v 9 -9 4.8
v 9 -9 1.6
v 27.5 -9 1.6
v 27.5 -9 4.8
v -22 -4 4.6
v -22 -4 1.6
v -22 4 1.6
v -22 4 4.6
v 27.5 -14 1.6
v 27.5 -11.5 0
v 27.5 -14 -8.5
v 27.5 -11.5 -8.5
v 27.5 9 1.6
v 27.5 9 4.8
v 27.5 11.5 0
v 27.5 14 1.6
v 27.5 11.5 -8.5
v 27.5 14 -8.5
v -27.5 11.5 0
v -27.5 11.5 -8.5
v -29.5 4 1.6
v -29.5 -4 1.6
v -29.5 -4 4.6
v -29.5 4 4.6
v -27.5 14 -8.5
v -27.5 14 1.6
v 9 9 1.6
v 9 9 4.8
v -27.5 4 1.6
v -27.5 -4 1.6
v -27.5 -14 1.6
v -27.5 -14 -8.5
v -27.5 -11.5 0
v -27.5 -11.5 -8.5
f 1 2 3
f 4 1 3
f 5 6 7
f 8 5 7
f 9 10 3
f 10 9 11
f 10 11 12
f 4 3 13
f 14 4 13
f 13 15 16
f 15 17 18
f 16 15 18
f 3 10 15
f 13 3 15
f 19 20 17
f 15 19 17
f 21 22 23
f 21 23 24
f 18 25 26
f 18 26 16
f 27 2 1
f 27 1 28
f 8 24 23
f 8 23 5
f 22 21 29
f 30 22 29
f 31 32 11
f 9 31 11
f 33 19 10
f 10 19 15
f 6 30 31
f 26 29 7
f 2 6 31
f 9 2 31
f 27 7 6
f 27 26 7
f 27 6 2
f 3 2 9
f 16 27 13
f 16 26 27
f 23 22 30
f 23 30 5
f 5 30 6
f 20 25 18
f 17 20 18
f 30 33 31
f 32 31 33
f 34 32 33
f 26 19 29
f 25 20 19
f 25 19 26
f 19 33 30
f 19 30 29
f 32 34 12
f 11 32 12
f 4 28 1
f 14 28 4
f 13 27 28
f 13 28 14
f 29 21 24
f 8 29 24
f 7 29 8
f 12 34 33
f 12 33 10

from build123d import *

# Parameters (mm, degrees)
SKETCH1_W          = 55
SKETCH1_H          = 28
PCB_DEPTH          = 1.6
SKETCH2_W          = 55
SKETCH2_H          = 2.5
HEADER_A_DEPTH     = 8.5
SKETCH3_W          = 55
SKETCH3_H          = 2.5
HEADER_B_DEPTH     = 8.5
SKETCH4_W          = 18.5
SKETCH4_H          = 18
WROOM_MODULE_DEPTH = 3.2
SKETCH5_W          = 7.5
SKETCH5_H          = 8
USB_DEPTH          = 3


with BuildPart() as part:
    # Sketch1 → PCB (new body)
    with BuildSketch(Plane.XY):
        Rectangle(SKETCH1_W, SKETCH1_H)
    extrude(amount=PCB_DEPTH)

    # Sketch2 → Header_A (add)
    with BuildSketch(Plane.XY.offset(-8.5)):
        with Locations((0, -12.75)):
            Rectangle(SKETCH2_W, SKETCH2_H)
    extrude(amount=HEADER_A_DEPTH)

    # Sketch3 → Header_B (add)
    with BuildSketch(Plane.XY.offset(-8.5)):
        with Locations((0, 12.75)):
            Rectangle(SKETCH3_W, SKETCH3_H)
    extrude(amount=HEADER_B_DEPTH)

    # Sketch4 → WROOM_module (add)
    with BuildSketch(Plane.XY.offset(1.6)):
        with Locations((18.25, 0)):
            Rectangle(SKETCH4_W, SKETCH4_H)
    extrude(amount=WROOM_MODULE_DEPTH)

    # Sketch5 → USB (add)
    with BuildSketch(Plane.XY.offset(1.6)):
        with Locations((-25.75, 0)):
            Rectangle(SKETCH5_W, SKETCH5_H)
    extrude(amount=USB_DEPTH)


solid = part.part
